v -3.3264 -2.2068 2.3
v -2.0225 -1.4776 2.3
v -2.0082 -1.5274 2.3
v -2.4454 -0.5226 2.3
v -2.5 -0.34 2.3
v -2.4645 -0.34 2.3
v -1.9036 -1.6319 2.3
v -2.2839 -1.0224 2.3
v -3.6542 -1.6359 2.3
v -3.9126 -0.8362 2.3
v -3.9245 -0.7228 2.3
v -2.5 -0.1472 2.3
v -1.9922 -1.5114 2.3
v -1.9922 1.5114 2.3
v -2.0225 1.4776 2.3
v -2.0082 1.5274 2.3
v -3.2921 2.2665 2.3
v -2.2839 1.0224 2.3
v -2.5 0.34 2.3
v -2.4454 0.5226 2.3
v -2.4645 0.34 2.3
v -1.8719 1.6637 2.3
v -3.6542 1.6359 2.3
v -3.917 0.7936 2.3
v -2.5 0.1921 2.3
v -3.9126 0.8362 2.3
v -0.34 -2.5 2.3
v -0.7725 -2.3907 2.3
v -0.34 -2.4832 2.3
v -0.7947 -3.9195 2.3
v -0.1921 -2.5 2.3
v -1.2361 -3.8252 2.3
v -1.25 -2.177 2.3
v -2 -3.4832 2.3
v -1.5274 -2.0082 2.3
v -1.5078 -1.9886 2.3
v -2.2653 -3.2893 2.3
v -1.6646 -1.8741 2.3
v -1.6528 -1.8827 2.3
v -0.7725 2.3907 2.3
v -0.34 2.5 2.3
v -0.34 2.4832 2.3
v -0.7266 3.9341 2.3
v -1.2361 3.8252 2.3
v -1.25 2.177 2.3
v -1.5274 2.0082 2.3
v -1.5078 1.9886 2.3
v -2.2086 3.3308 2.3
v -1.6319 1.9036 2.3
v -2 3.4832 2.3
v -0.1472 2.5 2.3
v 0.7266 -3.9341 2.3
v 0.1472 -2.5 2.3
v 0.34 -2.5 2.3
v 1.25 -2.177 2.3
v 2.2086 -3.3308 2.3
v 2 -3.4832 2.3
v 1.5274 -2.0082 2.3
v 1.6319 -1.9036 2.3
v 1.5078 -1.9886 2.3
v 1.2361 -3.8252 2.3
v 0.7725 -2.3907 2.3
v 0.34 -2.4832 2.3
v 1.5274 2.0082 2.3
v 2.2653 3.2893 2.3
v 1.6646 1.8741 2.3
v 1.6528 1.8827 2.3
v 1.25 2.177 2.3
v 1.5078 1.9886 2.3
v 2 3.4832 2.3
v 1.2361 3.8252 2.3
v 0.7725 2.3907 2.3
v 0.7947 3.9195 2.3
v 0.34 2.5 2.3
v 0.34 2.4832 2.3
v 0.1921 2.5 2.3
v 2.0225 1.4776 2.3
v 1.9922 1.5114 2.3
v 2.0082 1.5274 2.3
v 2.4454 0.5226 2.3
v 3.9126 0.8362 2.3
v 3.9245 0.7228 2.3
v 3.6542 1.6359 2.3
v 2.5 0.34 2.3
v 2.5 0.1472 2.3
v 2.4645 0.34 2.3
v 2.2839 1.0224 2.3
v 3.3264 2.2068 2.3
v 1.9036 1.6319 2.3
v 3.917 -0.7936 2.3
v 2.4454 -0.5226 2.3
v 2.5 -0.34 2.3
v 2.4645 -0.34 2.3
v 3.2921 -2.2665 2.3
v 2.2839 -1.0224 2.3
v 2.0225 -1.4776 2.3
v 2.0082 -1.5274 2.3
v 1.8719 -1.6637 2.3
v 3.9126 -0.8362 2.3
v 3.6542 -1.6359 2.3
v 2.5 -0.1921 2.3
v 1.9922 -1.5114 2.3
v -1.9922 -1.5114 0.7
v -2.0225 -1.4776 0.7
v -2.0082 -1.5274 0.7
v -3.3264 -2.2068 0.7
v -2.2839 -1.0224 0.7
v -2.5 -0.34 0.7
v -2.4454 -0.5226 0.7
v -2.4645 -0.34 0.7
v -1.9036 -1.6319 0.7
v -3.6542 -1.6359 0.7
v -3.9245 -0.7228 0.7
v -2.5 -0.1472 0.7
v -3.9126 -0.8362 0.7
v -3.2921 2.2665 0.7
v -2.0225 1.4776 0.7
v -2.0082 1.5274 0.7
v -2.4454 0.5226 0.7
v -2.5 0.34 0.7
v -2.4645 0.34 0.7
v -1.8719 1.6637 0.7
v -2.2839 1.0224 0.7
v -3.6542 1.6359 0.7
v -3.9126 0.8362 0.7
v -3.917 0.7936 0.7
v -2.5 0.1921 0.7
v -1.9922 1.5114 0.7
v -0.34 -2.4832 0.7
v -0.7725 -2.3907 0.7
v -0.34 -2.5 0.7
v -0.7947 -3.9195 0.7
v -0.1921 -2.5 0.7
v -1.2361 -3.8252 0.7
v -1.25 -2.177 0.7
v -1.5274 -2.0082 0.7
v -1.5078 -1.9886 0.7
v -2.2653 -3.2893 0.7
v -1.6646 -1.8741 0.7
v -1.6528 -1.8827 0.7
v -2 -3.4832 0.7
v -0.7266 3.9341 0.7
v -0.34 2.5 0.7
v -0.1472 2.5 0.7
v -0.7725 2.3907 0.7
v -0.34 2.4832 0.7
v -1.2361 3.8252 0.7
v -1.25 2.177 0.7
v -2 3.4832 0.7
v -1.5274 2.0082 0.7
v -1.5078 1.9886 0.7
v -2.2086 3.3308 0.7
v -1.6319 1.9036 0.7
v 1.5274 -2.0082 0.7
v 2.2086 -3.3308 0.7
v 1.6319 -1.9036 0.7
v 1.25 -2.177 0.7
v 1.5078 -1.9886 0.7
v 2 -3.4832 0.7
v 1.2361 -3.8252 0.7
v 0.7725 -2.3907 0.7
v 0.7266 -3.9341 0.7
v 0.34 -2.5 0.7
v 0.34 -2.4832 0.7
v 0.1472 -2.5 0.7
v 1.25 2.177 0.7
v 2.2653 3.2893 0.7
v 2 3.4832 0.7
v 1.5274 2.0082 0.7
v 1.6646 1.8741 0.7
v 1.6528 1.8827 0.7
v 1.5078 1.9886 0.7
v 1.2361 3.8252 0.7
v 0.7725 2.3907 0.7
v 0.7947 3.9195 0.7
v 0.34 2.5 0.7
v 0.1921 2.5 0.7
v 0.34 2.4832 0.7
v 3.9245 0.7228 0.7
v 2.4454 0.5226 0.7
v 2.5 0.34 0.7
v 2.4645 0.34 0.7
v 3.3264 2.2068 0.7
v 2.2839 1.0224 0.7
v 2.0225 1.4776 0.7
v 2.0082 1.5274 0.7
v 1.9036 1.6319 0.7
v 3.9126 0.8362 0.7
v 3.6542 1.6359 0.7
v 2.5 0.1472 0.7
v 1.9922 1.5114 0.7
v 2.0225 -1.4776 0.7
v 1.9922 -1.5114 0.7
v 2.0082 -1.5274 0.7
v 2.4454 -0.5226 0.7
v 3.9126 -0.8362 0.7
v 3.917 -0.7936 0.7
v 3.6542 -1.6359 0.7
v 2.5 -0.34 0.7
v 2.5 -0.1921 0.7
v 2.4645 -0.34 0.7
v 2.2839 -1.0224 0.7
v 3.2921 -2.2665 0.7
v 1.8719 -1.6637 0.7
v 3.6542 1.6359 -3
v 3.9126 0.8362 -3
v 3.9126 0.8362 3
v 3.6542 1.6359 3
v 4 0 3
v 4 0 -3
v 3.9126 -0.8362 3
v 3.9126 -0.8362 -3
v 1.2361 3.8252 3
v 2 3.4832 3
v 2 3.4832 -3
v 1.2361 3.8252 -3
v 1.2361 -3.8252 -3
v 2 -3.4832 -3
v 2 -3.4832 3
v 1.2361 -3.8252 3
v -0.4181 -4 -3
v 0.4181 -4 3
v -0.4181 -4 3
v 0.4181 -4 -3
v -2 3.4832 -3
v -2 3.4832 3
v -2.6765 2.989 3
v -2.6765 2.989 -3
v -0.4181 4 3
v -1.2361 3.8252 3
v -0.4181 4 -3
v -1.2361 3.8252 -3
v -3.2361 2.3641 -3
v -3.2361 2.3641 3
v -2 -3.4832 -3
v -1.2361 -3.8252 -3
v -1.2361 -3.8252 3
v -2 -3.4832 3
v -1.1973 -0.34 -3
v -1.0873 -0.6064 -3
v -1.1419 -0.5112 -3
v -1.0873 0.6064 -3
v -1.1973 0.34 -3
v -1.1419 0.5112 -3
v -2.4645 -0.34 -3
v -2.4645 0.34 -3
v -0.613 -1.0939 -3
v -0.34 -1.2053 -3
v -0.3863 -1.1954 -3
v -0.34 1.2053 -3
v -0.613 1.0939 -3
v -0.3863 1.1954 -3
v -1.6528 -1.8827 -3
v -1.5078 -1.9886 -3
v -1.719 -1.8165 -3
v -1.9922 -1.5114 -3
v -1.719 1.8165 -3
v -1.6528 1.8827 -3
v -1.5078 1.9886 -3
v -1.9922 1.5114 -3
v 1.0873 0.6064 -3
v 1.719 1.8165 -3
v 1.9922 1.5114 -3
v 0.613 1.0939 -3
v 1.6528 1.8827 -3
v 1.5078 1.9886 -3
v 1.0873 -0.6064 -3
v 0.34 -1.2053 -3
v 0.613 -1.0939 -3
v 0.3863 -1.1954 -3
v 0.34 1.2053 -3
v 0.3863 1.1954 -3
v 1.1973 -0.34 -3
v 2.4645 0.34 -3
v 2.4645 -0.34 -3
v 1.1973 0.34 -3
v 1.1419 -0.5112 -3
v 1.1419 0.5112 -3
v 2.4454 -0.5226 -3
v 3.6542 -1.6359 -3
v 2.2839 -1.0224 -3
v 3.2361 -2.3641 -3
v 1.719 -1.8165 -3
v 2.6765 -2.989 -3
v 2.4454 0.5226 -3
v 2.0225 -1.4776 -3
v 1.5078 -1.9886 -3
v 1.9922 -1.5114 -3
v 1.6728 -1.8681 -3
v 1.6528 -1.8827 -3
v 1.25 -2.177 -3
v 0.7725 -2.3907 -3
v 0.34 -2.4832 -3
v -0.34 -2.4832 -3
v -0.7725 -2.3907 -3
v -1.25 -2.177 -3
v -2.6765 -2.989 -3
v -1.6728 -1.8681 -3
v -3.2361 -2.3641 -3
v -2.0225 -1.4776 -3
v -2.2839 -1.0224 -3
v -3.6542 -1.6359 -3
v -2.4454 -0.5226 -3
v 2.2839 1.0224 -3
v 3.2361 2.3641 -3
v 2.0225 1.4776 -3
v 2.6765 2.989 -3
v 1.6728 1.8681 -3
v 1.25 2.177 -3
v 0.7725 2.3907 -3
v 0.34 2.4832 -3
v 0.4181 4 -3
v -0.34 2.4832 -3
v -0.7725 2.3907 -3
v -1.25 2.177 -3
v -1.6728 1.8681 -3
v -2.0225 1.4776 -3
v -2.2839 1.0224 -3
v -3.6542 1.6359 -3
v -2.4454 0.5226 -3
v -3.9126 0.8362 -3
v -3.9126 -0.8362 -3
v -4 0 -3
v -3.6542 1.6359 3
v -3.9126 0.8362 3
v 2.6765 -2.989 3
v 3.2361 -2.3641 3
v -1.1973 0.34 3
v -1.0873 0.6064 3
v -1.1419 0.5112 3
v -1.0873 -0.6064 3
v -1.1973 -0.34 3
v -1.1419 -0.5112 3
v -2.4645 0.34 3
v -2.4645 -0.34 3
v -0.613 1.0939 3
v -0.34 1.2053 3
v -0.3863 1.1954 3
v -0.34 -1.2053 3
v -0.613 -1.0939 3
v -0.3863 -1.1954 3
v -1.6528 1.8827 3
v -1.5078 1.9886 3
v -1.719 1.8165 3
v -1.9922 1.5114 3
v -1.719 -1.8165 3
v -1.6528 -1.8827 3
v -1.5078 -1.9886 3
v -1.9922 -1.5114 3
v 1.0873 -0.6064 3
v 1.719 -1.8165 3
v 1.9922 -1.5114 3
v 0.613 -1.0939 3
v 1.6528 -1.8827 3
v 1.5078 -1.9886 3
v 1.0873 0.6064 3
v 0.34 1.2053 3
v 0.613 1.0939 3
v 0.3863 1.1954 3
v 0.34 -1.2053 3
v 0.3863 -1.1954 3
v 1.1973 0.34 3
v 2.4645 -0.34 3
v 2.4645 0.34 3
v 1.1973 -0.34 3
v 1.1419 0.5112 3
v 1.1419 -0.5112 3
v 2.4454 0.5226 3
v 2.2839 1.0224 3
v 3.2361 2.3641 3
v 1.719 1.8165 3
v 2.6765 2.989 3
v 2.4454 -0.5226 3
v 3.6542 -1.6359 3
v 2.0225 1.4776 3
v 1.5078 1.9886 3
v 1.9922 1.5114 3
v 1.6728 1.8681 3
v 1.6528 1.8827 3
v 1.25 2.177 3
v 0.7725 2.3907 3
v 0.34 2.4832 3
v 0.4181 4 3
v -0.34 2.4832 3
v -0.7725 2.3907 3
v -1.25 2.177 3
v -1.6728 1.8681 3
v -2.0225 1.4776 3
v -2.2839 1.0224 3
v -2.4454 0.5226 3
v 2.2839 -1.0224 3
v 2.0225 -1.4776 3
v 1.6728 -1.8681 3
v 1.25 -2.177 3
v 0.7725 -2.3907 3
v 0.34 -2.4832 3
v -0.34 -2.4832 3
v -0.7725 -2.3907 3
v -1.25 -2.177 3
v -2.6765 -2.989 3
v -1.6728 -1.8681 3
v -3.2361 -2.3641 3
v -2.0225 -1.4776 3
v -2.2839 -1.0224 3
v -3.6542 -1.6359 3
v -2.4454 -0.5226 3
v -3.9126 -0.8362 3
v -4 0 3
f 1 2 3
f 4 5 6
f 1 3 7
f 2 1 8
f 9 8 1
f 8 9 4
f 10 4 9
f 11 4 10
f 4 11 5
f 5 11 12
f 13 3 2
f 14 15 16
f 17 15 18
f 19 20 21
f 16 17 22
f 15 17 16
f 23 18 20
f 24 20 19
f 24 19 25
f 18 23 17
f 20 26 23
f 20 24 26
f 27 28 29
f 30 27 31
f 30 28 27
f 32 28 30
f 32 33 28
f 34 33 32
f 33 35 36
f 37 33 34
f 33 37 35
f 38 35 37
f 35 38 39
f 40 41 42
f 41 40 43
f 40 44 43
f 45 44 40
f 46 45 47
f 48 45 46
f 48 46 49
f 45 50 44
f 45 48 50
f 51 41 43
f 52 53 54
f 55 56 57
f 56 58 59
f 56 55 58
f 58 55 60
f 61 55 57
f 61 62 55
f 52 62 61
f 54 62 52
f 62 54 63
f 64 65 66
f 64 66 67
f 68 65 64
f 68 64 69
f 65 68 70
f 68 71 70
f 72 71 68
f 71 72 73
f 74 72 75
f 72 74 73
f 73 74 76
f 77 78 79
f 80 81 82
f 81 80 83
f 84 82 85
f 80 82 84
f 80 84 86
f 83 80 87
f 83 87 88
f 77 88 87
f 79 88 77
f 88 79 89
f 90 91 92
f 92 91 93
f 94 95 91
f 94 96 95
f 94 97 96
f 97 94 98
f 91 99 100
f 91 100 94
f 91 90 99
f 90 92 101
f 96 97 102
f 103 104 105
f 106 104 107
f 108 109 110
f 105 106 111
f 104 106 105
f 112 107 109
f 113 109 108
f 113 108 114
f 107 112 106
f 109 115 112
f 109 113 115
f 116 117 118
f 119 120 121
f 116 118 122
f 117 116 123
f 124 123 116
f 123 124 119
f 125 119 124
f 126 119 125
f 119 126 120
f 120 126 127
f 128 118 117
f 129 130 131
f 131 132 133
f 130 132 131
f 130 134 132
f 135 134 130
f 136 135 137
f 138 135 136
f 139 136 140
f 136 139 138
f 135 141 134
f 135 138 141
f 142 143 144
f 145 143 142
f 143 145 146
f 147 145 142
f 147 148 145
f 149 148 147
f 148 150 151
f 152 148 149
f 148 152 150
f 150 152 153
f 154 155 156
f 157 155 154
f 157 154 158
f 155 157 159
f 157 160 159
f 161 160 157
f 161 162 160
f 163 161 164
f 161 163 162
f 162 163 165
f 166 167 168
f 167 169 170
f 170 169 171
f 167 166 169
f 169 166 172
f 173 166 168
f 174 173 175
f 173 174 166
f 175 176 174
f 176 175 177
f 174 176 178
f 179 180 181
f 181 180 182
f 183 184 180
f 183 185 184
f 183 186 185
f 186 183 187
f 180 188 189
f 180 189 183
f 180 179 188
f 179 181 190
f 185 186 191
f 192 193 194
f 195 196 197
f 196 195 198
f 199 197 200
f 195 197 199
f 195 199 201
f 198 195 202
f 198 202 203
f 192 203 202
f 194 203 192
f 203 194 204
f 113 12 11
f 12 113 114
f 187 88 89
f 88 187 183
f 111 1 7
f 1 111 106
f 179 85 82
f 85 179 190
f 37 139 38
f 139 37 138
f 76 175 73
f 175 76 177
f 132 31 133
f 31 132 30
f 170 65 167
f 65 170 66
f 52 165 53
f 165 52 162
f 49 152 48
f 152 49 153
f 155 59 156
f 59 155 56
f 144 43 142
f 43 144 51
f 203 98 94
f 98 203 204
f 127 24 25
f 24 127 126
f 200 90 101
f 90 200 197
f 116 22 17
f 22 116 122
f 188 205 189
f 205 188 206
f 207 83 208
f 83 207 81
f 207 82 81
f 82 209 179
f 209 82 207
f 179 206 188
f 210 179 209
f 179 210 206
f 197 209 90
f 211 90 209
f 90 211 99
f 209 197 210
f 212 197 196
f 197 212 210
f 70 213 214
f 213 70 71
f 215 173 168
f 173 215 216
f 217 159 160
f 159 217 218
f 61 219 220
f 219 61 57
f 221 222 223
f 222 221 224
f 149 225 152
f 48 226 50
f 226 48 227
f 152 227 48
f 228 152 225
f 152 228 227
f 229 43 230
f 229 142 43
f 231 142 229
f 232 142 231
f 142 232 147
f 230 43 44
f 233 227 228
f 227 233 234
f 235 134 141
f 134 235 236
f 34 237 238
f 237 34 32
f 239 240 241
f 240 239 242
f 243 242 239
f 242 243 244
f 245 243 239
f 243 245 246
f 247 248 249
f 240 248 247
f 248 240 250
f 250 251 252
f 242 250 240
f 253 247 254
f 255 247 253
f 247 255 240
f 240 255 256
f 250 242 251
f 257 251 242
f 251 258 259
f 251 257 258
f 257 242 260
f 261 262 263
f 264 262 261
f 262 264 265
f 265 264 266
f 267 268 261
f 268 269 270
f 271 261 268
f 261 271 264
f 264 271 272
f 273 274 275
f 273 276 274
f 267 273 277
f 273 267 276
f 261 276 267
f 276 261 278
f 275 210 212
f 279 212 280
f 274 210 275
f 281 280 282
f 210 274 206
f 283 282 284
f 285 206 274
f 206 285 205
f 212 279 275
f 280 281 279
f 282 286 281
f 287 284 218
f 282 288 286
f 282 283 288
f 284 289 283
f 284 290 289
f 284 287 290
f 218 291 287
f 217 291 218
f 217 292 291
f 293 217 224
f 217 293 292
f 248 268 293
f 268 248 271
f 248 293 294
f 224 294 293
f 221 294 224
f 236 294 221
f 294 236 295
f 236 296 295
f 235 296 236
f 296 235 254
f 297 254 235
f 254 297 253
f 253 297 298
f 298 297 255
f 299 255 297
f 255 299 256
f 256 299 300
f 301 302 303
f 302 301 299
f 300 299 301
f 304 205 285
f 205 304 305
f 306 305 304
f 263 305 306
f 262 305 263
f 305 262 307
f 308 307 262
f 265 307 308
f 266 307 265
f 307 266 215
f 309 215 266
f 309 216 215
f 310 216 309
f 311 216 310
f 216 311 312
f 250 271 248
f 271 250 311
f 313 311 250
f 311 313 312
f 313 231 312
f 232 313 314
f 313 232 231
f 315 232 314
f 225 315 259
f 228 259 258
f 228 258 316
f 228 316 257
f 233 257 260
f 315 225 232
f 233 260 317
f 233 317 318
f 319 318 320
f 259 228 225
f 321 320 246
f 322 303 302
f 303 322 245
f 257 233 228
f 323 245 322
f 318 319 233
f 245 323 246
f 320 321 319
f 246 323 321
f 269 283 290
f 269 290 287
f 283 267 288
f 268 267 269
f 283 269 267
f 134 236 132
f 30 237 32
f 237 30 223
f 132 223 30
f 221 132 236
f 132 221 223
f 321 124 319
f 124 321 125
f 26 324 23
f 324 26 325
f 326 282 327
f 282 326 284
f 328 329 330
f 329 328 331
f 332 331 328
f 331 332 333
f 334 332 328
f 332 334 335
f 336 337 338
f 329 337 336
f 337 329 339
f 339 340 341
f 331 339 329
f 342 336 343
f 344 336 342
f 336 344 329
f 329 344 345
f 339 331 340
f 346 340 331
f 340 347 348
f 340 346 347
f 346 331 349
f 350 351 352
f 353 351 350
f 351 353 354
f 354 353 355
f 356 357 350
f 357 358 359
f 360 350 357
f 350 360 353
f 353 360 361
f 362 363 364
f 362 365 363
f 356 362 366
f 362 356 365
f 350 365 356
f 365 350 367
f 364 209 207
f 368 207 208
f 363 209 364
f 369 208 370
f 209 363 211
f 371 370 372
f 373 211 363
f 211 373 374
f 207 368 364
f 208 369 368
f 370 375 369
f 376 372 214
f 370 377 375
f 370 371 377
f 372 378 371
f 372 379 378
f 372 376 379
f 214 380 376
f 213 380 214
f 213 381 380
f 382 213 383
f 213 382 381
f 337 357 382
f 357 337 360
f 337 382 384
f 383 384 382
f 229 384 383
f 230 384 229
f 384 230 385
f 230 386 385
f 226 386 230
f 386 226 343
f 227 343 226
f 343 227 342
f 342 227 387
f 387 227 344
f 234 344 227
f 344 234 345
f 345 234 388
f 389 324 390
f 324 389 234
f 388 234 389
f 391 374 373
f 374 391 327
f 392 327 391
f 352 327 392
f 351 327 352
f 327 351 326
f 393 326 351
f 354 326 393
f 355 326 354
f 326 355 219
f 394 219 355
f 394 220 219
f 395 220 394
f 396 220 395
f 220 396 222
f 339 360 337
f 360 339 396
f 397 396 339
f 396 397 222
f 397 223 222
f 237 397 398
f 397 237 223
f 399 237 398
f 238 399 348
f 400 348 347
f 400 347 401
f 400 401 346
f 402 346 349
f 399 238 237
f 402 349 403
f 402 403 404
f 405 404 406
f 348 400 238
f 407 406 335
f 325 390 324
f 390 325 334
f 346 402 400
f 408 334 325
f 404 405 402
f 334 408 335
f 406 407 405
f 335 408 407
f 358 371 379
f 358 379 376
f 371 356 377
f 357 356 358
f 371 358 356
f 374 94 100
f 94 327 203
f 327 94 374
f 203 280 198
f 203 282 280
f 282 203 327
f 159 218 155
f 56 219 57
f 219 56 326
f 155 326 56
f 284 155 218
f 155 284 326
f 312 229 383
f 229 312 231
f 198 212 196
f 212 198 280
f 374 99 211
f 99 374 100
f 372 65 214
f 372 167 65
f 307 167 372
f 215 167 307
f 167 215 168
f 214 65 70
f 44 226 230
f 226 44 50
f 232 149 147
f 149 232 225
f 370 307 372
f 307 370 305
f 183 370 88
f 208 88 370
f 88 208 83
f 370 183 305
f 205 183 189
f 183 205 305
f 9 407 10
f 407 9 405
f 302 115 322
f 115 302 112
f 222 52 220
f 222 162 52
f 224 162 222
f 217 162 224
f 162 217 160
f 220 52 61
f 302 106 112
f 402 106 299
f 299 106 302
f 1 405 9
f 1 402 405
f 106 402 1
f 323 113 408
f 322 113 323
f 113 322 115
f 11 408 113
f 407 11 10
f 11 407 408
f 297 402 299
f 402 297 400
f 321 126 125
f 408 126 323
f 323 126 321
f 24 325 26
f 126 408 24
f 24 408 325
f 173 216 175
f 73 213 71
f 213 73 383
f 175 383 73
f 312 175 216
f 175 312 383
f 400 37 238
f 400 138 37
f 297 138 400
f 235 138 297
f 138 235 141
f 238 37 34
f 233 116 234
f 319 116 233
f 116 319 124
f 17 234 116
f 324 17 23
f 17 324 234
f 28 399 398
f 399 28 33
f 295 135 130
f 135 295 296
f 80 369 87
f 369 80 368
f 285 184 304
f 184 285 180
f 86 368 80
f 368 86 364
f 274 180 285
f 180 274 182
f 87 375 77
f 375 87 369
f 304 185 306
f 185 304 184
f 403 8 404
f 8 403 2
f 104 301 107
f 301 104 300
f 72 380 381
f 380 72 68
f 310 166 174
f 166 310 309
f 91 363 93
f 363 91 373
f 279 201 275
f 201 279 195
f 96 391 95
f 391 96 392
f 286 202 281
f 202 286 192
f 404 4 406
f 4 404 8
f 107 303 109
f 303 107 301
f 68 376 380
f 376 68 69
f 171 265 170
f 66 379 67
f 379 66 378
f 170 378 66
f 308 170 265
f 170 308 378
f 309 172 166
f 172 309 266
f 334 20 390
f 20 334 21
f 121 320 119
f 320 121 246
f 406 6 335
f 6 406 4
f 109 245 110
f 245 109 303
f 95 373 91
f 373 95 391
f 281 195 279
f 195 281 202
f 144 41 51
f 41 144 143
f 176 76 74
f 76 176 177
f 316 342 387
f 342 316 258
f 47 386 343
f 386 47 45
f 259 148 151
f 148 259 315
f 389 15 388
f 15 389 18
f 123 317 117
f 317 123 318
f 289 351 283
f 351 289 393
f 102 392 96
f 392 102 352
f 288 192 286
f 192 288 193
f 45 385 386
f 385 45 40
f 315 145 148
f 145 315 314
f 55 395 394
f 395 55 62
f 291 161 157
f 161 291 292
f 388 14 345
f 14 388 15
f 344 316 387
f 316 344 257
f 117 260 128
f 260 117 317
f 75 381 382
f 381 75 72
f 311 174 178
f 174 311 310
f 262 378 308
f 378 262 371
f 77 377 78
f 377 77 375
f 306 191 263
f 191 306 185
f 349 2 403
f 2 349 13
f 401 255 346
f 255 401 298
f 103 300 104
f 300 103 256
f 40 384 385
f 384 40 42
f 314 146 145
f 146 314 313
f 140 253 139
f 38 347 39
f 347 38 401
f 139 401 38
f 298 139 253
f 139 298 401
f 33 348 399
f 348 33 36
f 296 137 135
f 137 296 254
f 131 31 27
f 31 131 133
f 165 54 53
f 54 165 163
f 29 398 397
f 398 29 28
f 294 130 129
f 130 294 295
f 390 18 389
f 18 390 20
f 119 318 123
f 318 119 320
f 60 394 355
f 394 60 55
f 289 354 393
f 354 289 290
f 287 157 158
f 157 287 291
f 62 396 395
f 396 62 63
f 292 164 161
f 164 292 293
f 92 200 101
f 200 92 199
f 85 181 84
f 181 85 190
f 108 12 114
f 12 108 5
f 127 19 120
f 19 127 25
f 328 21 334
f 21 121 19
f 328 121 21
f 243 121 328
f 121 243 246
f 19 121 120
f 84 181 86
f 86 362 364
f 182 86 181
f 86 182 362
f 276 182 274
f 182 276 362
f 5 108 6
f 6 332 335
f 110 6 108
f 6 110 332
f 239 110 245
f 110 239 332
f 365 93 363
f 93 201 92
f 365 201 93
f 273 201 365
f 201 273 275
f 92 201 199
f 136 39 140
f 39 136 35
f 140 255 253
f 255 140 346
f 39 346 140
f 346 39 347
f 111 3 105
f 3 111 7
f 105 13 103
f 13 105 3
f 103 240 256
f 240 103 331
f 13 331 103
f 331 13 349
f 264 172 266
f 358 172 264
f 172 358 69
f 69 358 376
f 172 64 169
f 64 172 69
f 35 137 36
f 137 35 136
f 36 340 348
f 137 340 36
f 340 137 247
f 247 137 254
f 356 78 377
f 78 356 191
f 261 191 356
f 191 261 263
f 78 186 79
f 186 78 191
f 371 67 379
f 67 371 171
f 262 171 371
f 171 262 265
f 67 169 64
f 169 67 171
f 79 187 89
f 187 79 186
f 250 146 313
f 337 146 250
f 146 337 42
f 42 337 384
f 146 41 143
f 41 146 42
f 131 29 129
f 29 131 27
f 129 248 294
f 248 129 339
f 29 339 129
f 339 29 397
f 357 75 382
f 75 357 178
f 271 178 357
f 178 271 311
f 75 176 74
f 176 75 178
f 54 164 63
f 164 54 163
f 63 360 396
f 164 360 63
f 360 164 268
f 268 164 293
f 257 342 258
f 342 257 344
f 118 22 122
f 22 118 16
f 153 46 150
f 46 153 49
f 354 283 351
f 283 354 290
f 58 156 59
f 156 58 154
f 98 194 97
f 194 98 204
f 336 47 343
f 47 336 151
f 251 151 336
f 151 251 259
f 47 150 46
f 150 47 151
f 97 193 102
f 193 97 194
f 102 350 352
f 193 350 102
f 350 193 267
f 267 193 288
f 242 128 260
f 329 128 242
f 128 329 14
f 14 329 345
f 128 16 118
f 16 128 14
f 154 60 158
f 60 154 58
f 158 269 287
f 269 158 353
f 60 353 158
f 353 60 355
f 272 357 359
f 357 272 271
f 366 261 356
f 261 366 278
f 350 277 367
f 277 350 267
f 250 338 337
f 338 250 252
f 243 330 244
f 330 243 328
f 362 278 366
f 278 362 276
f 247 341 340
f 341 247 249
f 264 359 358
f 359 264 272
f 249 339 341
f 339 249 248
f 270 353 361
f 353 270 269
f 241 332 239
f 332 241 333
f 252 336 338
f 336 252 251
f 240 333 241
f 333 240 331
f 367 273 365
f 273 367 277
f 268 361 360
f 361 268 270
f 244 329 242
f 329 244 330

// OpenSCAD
/* [Basic] */

d = 8;            // [4:20]
height = 6;       // [1:20]
// Must small than `d`, affects flow
d_inner = 5;      // [3:20]
// Diameter of central rod, affects flow
d_central = 2.5;  // [0:10]

/* [Advanced] */

// Thickness of the radial walls 
thickness = 0.68;

// ----------------
/* [Hidden] */

$fn=30;

difference() {
  rod(d=d, h=height);
  rod(d=d_inner, h=height+1);
  translated(height/4*z) rotated(22*z) rotated(45*z, n=[0:3]) box([d+1, d/5, d/5]);
}

rotated(45*z, n=[0:3]) box([d_inner, thickness, height]);
rod(d=d_central, h=height);


// ----------------
// https://github.com/davidson16807/relativity.scad

_digit = "0123456789";
_lowercase = "abcdefghijklmnopqrstuvwxyz";
_uppercase = "ABCDEFGHIJKLMNOPQRSTUVWXYZ";
_letter = str(_lowercase, _uppercase);
_alphanumeric = str(_letter, _digit);
_variable_safe = str(_alphanumeric, "_");
_whitespace = " \t\r\n";
_nonsymbol = str(_alphanumeric, _whitespace);

_regex_ops = "?*+&|";

_strings_version = 
	[2014, 3, 17];
function strings_version() =
	_strings_version;
function strings_version_num() =
	_strings_version.x * 10000 + _strings_version.y * 100 + _strings_version.z;

//returns a list representing the tokenization of an input string
//echo(tokenize("not(foo)"));
//echo(tokenize("foo bar baz  "));
_token_regex_ignore_space = _parse_rx("\\w+|\\S");
_token_regex = _parse_rx("\\w+|\\S|\\s+");
function tokenize(string, ignore_space=true) = 
    _tokenize(string, ignore_space? _token_regex_ignore_space : _token_regex);
function _tokenize(string, pattern) = 
    _grep(string, _index_of(string, pattern, regex=true));

function grep(string, pattern, ignore_case=false) = 		//string
    _grep(string, _index_of(string, _parse_rx(pattern), regex=true, ignore_case=ignore_case));
function _grep(string, indices) = 
    [for (index = indices)
        between(string, index.x, index.y)
    ];


function replace(string, replaced, replacement, ignore_case=false, regex=false) = 
	_replace(string, replacement, index_of(string, replaced, ignore_case=ignore_case, regex=regex));
    
function _replace(string, replacement, indices, i=0) = 
    i >= len(indices)?
        after(string, indices[len(indices)-1].y-1)
    : i == 0?
        str( before(string, indices[0].x), replacement, _replace(string, replacement, indices, i+1) )
    :
        str( between(string, indices[i-1].y, indices[i].x), replacement, _replace(string, replacement, indices, i+1) )
    ;


function split(string, seperator=" ", ignore_case = false, regex=false) = 
	_split(string, index_of(string, seperator, ignore_case=ignore_case, regex=regex));
    
function _split(string, indices, i=0) = 
    len(indices) == 0?
        [string]
    : i >= len(indices)?
        _coalesce_on(after(string, indices[len(indices)-1].y-1), "", [])
    : i == 0?
        concat( _coalesce_on(before(string, indices[0].x), "", []), _split(string, indices, i+1) )
    :
        concat( between(string, indices[i-1].y, indices[i].x), _split(string, indices, i+1) )
    ;

function contains(string, substring, ignore_case=false, regex=false) = 
	regex?
        _index_of_first(string, _parse_rx(substring), regex=regex, ignore_case=ignore_case) != undef
	:
		_index_of_first(string, substring, regex=regex, ignore_case=ignore_case) != undef
	; 
	


function index_of(string, pattern, ignore_case=false, regex=false) = 
	_index_of(string, 
        regex? _parse_rx(pattern) : pattern, 
        regex=regex, 
        ignore_case=ignore_case);
function _index_of(string, pattern, pos=0, regex=false, ignore_case=false) = 		//[start,end]
	pos == undef?
        undef
	: pos >= len(string)?
		[]
	:
        _index_of_recurse(string, pattern, 
            _index_of_first(string, pattern, pos=pos, regex=regex, ignore_case=ignore_case),
            pos, regex, ignore_case)
	;
function _index_of_recurse(string, pattern, index_of_first, pos, regex, ignore_case) = 
    index_of_first == undef?
        []
    : concat(
        [index_of_first],
        _coalesce_on(
            _index_of(string, pattern, 
                    pos = index_of_first.y,
                    regex=regex,
                    ignore_case=ignore_case),
            undef,
            [])
    );
function _index_of_first(string, pattern, pos=0, ignore_case=false, regex=false) =
	pos == undef?
        undef
    : pos >= len(string)?
		undef
	: _coalesce_on([pos, _match(string, pattern, pos, regex=regex, ignore_case=ignore_case)], 
		[pos, undef],
		_index_of_first(string, pattern, pos+1, regex=regex, ignore_case=ignore_case))
    ;
function _match(string, pattern, pos, regex=false, ignore_case=false) = 
    regex?
        _match_parsed_rx(string, pattern, pos, ignore_case=ignore_case)
    : starts_with(string, pattern, pos, ignore_case=ignore_case)? 
        pos+len(pattern) 
    : 
        undef
    ;
    
    
function starts_with(string, start, pos=0, ignore_case=false, regex=false) = 
	regex?
		_match_parsed_rx(string,
			_parse_rx(start), 
			pos, 
			ignore_case=ignore_case) != undef
	:
		equals(	substring(string, pos, len(start)), 
			start, 
			ignore_case=ignore_case)
	;
function ends_with(string, end, ignore_case=false) =
	equals(	after(string, len(string)-len(end)-1), 
		end,
		ignore_case=ignore_case)
	;







function _match_regex(string, pattern, pos=0, ignore_case=false) = 		//end pos
	_match_parsed_rx(string,
		_parse_rx(pattern), 
		pos, 
		ignore_case=ignore_case);
	
//converts an infix notated regex string to a parse tree using the shunting yard algorithm
function _parse_rx(	rx, 		ops=[], 	args=[], 				i=0) = 
	rx == undef?
		undef
	: i >= len(rx)?
		len(ops) <= 0?
			args[0]
		:
			_parse_rx(rx, _pop(ops), 	_push_rx_op(args, ops[0]), 		i)
			
			
	: ops[0] == "{"?
		rx[i] == "}"?
			_parse_rx(rx, _pop(ops), 	_push_rx_op(args, ops[0]), 		 i+1)
		: rx[i] == ","?
			_parse_rx(rx, ops, 		_swap(args, _push(args[0], "")), 	 i+1)
		: 
			_parse_rx(rx, ops, 		_swap(args, _swap(args[0], str(args[0][0], rx[i]))), i+1)
			
			
	: ops[0] == "[" || ops[0] == "[^"?
		rx[i] == "]"?
			_parse_rx(rx, _pop(ops), 	_push_rx_op(args, ops[0]), 		i+1)
		: rx[i] == "\\"?
			_parse_rx(rx, ops, 		_swap(args, _push(args[0],rx[i+1])), 	i+2)
		: rx[i] == "-"?
			_parse_rx(rx, ops, 		_swap(args, _push(_pop(args[0]), ["-", args[0][0], rx[i+1]])), i+2)
		:
			_parse_rx(rx, ops, 		_swap(args, _push(args[0], rx[i])), 	i+1)
	: rx[i] == "[" && rx[i+1] == "^"?
		!_can_concat(rx, i)?
			_parse_rx(rx, _push(ops, "[^"),	_push(args, []),	 		i+2)
		: _can_shunt(ops, "&")?
			_parse_rx(rx, _push(_push(ops,"&"),"[^"), _push(args, []), i+2)
		:
			_parse_rx(rx, _pop(ops), 	_push_rx_op(args, ops[0]), 		i)
	: rx[i] == "["?
		!_can_concat(rx, i)?
			_parse_rx(rx, _push(ops, "["), 	_push(args, []),	 		i+1)
		: _can_shunt(ops, "&")?
			_parse_rx(rx, _push(_push(ops,"&"),"["), _push(args, []), i+1)
		:
			_parse_rx(rx, _pop(ops), 	_push_rx_op(args, ops[0]), 		i)
			
	: rx[i] == "{"?
			_parse_rx(rx, _push(ops, "{"),	_push(args, ["", []]), 			i+1)
			
			
	: is_in(rx[i], _regex_ops)?
		_can_shunt(ops, rx[i])?
			_parse_rx(rx, _push(ops, rx[i]), args, 		 		i+1)
		:
			_parse_rx(rx, _pop(ops), 	_push_rx_op(args, ops[0]), 		i)
	: rx[i] == ")"?
		ops[0] == "(" ?
			_parse_rx(rx, _pop(ops), 	args,			 		i+1)
		: len(ops) <= 0 ?
			_parse_rx(rx, ops, 		args,			 		i+1)
		: 
			_parse_rx(rx, _pop(ops), 	_push_rx_op(args, ops[0]), 		i)
	: rx[i] == "("?
		!_can_concat(rx, i)?
			_parse_rx(rx, _push(ops, "("), 	args, 		 			i+1)
		: _can_shunt(ops, "&")?
			_parse_rx(rx, _push(_push(ops, "&"), "("), args, 	 		i+1)
		:
			_parse_rx(rx, _pop(ops), 	_push_rx_op(args, ops[0]), 		i)
	: rx[i] == "\\"?
		!_can_concat(rx, i)?
			_parse_rx(rx, ops, 			_push(args,str(rx[i],rx[i+1])),	i+2)
		: _can_shunt(ops, "&")?
			_parse_rx(rx, _push(ops, "&"),	_push(args,str(rx[i],rx[i+1])),	i+2)
		:
			_parse_rx(rx, _pop(ops), 	_push_rx_op(args, ops[0]), 		i)
	:
		!_can_concat(rx, i)?
			_parse_rx(rx, ops, 		_push(args, rx[i]),	 		i+1)
		: _can_shunt(ops, "&")?
			_parse_rx(rx, _push(ops, "&"),	_push(args, rx[i]),	 		i+1)
		:
			_parse_rx(rx, _pop(ops), 	_push_rx_op(args, ops[0]), 		i)
	;

	
function _can_concat(regex, i) = 
	regex[i-1] != undef &&
	(!is_in(regex[i-1], "|(") || regex[i-2] == "\\");
	
function _can_shunt(stack, op) = 
	stack[0] == "(" || 
	len(stack) <= 0 || 
	_precedence(op, _regex_ops) < _precedence(stack[0], _regex_ops);
	
function _push_rx_op(stack, op) = 
	is_in(op[0], "[?*+")? // is unary?
		_push(_pop(stack), 	[op, stack[0]])
	: 		 	// is binary?
		_push(_pop(stack,2), 	[op, stack[1][0], stack[0], ])
	;

function _swap(stack, replacement) = 
	_push(_pop(stack), replacement);
function _pop(stack, n=1) = 
	n <= 1?
		len(stack) <=0? [] : stack[1]
	:
		_pop(_pop(stack), n-1)
	;
function _push(stack, char) = 
	[char, stack];

function _precedence(op, ops) = 
	search(op, ops)[0];
	
function _match_parsed_rx(string, regex, string_pos=0, ignore_case=false) = 
	//INVALID INPUT
	string == undef?
		undef
	
	//string length and anchors
	: regex == "^"?
		string_pos == 0?
			string_pos
		:
			undef
	: regex == "$"?
		string_pos >= len(string)?
			string_pos
		:
			undef
	: string_pos == undef?
		undef
	: string_pos >= len(string)?
		undef
		
	//ALTERNATION
	: regex[0] == "|" ?
		_null_coalesce(
			_match_parsed_rx(string, regex[1], string_pos, ignore_case=ignore_case),
			_match_parsed_rx(string, regex[2], string_pos, ignore_case=ignore_case)
		)

	//KLEENE STAR
	: regex[0] == "*" ?
		_match_repetition(string, regex[1],
			0, undef,
			string_pos,
			ignore_case=ignore_case)

	//KLEENE BRACKETS
	: regex[0] == "{" ?
		regex[2][1][0] == undef?
			_match_repetition(string, regex[1],
				_parse_int(regex[2][0], 10), undef,
				string_pos,
				ignore_case=ignore_case)
		:
			_match_repetition(string, regex[1],
				_parse_int(regex[2][1][0], 10), _parse_int(regex[2][0], 10),
				string_pos,
				ignore_case=ignore_case)
		
	//KLEENE PLUS
	: regex[0] == "+" ?
		_match_repetition(string, regex[1],
			1, undef,
			string_pos,
			ignore_case=ignore_case)

	//OPTION
	: regex[0] == "?" ?
		_match_repetition(string, regex[1],
			0, 1,
			string_pos,
			ignore_case=ignore_case)

	//CONCATENATION
	: regex[0] == "&" ?	
		_match_parsed_rx(string, regex[2], 
			_match_parsed_rx(string, regex[1], string_pos, ignore_case=ignore_case), 
			ignore_case=ignore_case)
			
	//ESCAPE CHARACTER
	: regex == "\\d"?
		is_in(string[string_pos], _digit)?
			string_pos+1
		: 
			undef
	: regex == "\\s"?
		is_in(string[string_pos], _whitespace)?
			string_pos+1
		: 
			undef
	: regex == "\\w"?
		is_in(string[string_pos], _alphanumeric)?
			string_pos+1
		: 
			undef
	: regex == "\\D"?
		!is_in(string[string_pos], _digit)?
			string_pos+1
		: 
			undef
				
	: regex == "\\S"?
		!is_in(string[string_pos], _whitespace)?
			string_pos+1
		: 
			undef
	: regex == "\\W"?
		!is_in(string[string_pos], _alphanumeric)?
			string_pos+1
		: 
			undef
	: regex[0] == "\\"?
		string[string_pos] == regex[0][1]?
			string_pos+1
		:
			undef
	
	//CHARACTER SET
	: regex[0] == "[" ?
		_is_in_stack(string[string_pos], regex[1], ignore_case=ignore_case)?
			string_pos+1
		:
			undef
	//NEGATIVE CHARACTER SET
	: regex[0] == "[^" ?
		!_is_in_stack(string[string_pos], regex[1], ignore_case=ignore_case)?
			string_pos+1
		:
			undef
		
	//LITERAL
	: equals(string[string_pos], regex, ignore_case=ignore_case) ?
		string_pos+1
	
	//WILDCARD
	: regex == "."?
		string_pos+1
	
	//NO MATCH
	: 
		undef
	;


function is_empty(string) = 
	string == "";

function is_null_or_empty(string) = 
	string == undef || string == "";
	
function is_null_or_whitespace(string) = 
	string == undef || trim(string) == "";

function trim(string) = 
	string == undef?
		undef
	: string == ""?
		""
	:
		_null_coalesce(
			between(string, _match_set(string, _whitespace, 0), 
					_match_set_reverse(string, _whitespace, len(string))),
			""
		)
	;

function _match_repetition(string, regex, min_reps, max_reps, pos, ignore_case=false) = 
    pos == undef?
        undef
    : pos > len(string)?
        undef
	: _null_coalesce(
		_match_repetition(string, regex, min_reps-1, max_reps-1, 
			_match_parsed_rx(string, regex, pos, ignore_case=ignore_case), 
            ignore_case=ignore_case),
		(min_reps== undef || min_reps <= 0) && (max_reps == undef || max_reps >= 0)?
			pos
		: 
			undef
	);
	
function _match_set(string, set, pos) = 
	pos >= len(string)?
		len(string)
	: is_in(string[pos], set )?
		_match_set(string, set, pos+1)
	: 
		pos
	;

function _match_set_reverse(string, set, pos) = 
	pos <= 0?
		0
	: is_in(string[pos-1], set)?
		_match_set_reverse(string, set, pos-1)
	: 
		pos
	;

function _match_quote(string, quote_char, pos) = 
	pos >= len(string)?
		len(string)
	: string[pos] == quote_char?
		pos
	: string[pos] == "\\"? 
		_match_quote(string, quote_char, pos+2)
	: 
		_match_quote(string, quote_char, pos+1)
	;

	
function _is_in_range(char, min_char, max_char) = 
	search(char, _alphanumeric,0)[0][0] >= search(min_char, _alphanumeric,0)[0][0] &&
	search(char, _alphanumeric,0)[0][0] <= search(max_char, _alphanumeric,0)[0][0];
function _is_in_stack(string, stack, ignore_case=false) = 
	stack == undef?
		false
	: len(stack) <= 0?
		false
	: stack[0][0] == "-"?
		_is_in_range(string, stack[0][1], stack[0][2])
	: string == stack[0]?
		true
	: ignore_case && lower(string) == lower(stack[0])?
		true
	:
		_is_in_stack(string, _pop(stack), ignore_case=ignore_case)
	;

function equals(this, that, ignore_case=false) = 
	ignore_case?
		lower(this) == lower(that)
	:
		this==that
	;

function lower(string) = 
	_transform_case(string, search(string, "ABCDEFGHIJKLMNOPQRSTUVWXYZ",0), 97);

function upper(string) = 
	_transform_case(string, search(string, "abcdefghijklmnopqrstuvwxyz",0), 65);

//TODO: convert to list comprehensions
function _transform_case(string, encodings, offset) = 
    join([for (i = [0:len(encodings)-1])
            len(encodings[i]) > 0?
                chr(encodings[i][0] + offset)
            :
                string[i]
    ])
	;


function reverse(string) = 
	string == undef?
		undef
	: len(string) <= 0?
		""
	: 
        join([for (i = [0:len(string)-1]) string[len(string)-1-i]])
    ;

function substring(string, start, length=undef) = 
	length == undef? 
		between(string, start, len(string)) 
	: 
		between(string, start, length+start)
	;

//note: start is inclusive, end is exclusive
function between(string, start, end) = 
	string == undef?
		undef
	: start == undef?
		undef
	: start > len(string)?
		undef
	: start < 0?
		before(string, end)
	: end == undef?
		undef
	: end < 0?
		undef
	: end > len(string)?
		after(string, start-1)
	: start > end?
		undef
	: start == end ? 
		"" 
	: 
        join([for (i=[start:end-1]) string[i]])
	;

function before(string, index=0) = 
	string == undef?
		undef
	: index == undef?
		undef
	: index > len(string)?
		string
	: index <= 0?
		""
	: 
        join([for (i=[0:index-1]) string[i]])
	;

function after(string, index=0) =
	string == undef?
		undef
	: index == undef?
		undef
	: index < 0?
		string
	: index >= len(string)-1?
		""
	:
        join([for (i=[index+1:len(string)-1]) string[i]])
	;
	

	

function parse_int(string, base=10, i=0, nb=0) = 
	string[0] == "-" ? 
		-1*_parse_int(string, base, 1) 
	: 
		_parse_int(string, base);

function _parse_int(string, base, i=0, nb=0) = 
	i == len(string) ? 
		nb 
	: 
		nb + _parse_int(string, base, i+1, 
				search(string[i],"0123456789ABCDEF")[0]*pow(base,len(string)-i-1));
                
function join(strings, delimeter="") = 
	strings == undef?
		undef
	: strings == []?
		""
	: _join(strings, len(strings)-1, delimeter, 0);
function _join(strings, index, delimeter) = 
	index==0 ? 
		strings[index] 
	: str(_join(strings, index-1, delimeter), delimeter, strings[index]) ;
	
function is_in(string, list, ignore_case=false) = 
	string == undef?
		false
    : 
        any([ for (i = [0:len(list)-1]) equals(string, list[i], ignore_case=ignore_case) ])
	;
function any(booleans, index=0) = 
    index > len(booleans)?
        false
    : booleans[index]?
        true
    :
        any(booleans, index+1)
    ;
function all(booleans, index=0) = 
	index >= len(booleans)?
		true
	: !booleans[index]?
		false
	: 
		all(booleans, index+1)
	;

function _null_coalesce(string, replacement) = 
	string == undef?
		replacement
	:
		string
	;
function _coalesce_on(value, error, fallback) = 
	value == error?
		fallback
	: 
		value
	;
	

















function relativity_version() =
	[2015, 11, 26];
function relativity_version_num() = 
	relativity_version().x * 10000 + relativity_version().y * 100 + relativity_version().z;
//echo(str("relativity.scad ", relativity_version().x, ".", relativity_version().y, ".", relativity_version().z));

if(version_num() < 20150000)
	echo("WARNING: relativity.scad requires OpenSCAD version 2015.03 or higher");


// an arbitrarily large number
// must be finite to allow use in geometric operations
// interaction between objects of indeterminate size results in undefined behavior
indeterminate = 1e6;

// an arbitrarily small number
// must be nonzero to meet the assumptions of the library

infinitesimal = 0.001;

// helper variables for aligning along the z axis
top = [0,0,1];
center=[0,0,0];
bottom = [0,0,-1];
up = [0,0,1];
down = [0,0,-1];
x = [1,0,0];
y = [0,1,0];
z = [0,0,1];

// properties of the last instance of rod/box/ball in the call stack
$parent_size=[0,0,0];
$parent_bounds=[0,0,0];
$parent_radius=0;
$parent_type="space";
// a stack of classes used by all ancestors
$_ancestor_classes = [];
_token_regex_ignore_dash = _parse_rx("(\\w|-)+|\\S");

//inhereted properties common to all geometric primitives in relativity.scad
// indicates the class(es) to render
$_show = "*";
// indicates the class that is either assigned-to or inherited-by an object
$class = [];
// indicates the absolute position of a primitive
$position = [0,0,0];
// a vector indicating the direction of a parent object		
$inward = [0,0,0];		
$outward = [0,0,0];

//hadamard product (aka "component-wise" product) for vectors
function hadamard(v1,v2) = [v1.x*v2.x, v1.y*v2.y, v1.z*v2.z];

module class(name){
    _assign($class = name)
	_assign($_ancestor_classes = _push($_ancestor_classes, _tokenize($class, _token_regex_ignore_dash)))
    if(_sizzle_engine($_ancestor_classes, $_show))  
        children();
}

module selectable(){
    _assign(
        $_ancestor_classes = _push($_ancestor_classes, 
            _tokenize($class, _token_regex_ignore_dash)
        )
    )
    if(_sizzle_engine($_ancestor_classes, $_show))  
        children();
}

module _child_wrapper(){
    for (i = [0 : $children-1]){
        //selectable()
        children(i);
    }
}

// form repeating patterns through translation
module translated(offsets, n=[1], class="*"){
	offsets = len(offsets.x) == undef && offsets.x != undef? [offsets] : offsets;
	for(offset=offsets)
	{
        show(class)
        for(i=n)
            _translate(offset*i)
                _child_wrapper() children();
        hide(class)
            _child_wrapper() children();
    }
}

// form radially symmetric objects around the z axis
module rotated(offsets, n=[1], class="*"){
	offsets = len(offsets.x) == undef && offsets.x != undef? [offsets] : offsets;
	for(offset=offsets)
	{
        show(class)
        for(i=n)
            rotate(offset*i)
                _child_wrapper() children();
        hide(class)
            _child_wrapper() children();
    }
}

// form bilaterally symmetric objects using the mirror() function
module mirrored(axes=[0,0,0], class="*"){
	axes = len(axes.x) == undef && axes.x != undef? [axes] : axes;
	for(axis=axes)
	{
        show(class)
        mirror(axis)
            _child_wrapper() children();
        show(class)
            _child_wrapper() children();
        hide(class)
            _child_wrapper() children();
    }
}

module attach(class){
	_assign($_ancestor_classes = _push($_ancestor_classes, _tokenize($class, _token_regex_ignore_dash)))
	_assign($_show=["and", $_show, ["descendant", "*", _sizzle_parse(class)]])
	_child_wrapper() children();
}

module show(class="*"){
	_assign($_show=["and", $_show, _sizzle_parse(class)])
	_child_wrapper() children();
}

module hide(class="*"){
	_assign($_show=["and", $_show, ["not", _sizzle_parse(class)]])
	_child_wrapper() children();
}

module colored(color, class="*"){
	_assign($_show=["and", $_show, _sizzle_parse(class)])
	color(color)
	_child_wrapper() children();
	
	hide(class)
	_child_wrapper() children();
}

module scaled(v=[0,0,0], class="*"){
	_assign($_show=["and", $_show, _sizzle_parse(class)])
	scale(v)
	_child_wrapper() children();
	
	hide(class)
	_child_wrapper() children();
}

module resized(newsize, class="*"){
	_assign($_show=["and", $_show, _sizzle_parse(class)])
	resize(newsize)
	_child_wrapper() children();
	
	hide(class)
	_child_wrapper() children();
}

module hulled(class="*"){
    _assign($_ancestor_classes = _push($_ancestor_classes, _tokenize($class, _token_regex_ignore_dash)))
	if(_sizzle_engine($_ancestor_classes, $_show))
	hull()
	_assign($_show=_sizzle_parse(class))
	_child_wrapper() children();
	
	hide(class)
	_child_wrapper() children();
}

// performs the union on objects marked as positive space (i.e. objects where $class = positive), 
// and performs the difference for objects marked as negative space (i.e objects where $class = $negative)
module differed(negative, positive="*", unaffected=undef){
	_positive = _sizzle_parse(positive);
	_negative = _sizzle_parse(negative);
	_unaffected = unaffected != undef? 
        _sizzle_parse(unaffected) : ["not", ["or", _positive, _negative]];
    
    _assign($_ancestor_classes = _push($_ancestor_classes, _tokenize($class, _token_regex_ignore_dash)))
    if(_sizzle_engine($_ancestor_classes, $_show))
    difference(){
        _assign($_show = _positive)
            _child_wrapper() children();
        _assign($_show = _negative)
            _child_wrapper() children();
    }
    _assign($_show=["and", $_show, _unaffected])
        _child_wrapper() children();
}

// performs the intersection on a list of object classes
module intersected(class1, class2, unaffected=undef){
	class1 = _sizzle_parse(class1);
	class2 = _sizzle_parse(class2);
	unaffected = unaffected != undef? 
		unaffected : ["not", ["or", class1, class2]];
    
    _assign($_ancestor_classes = _push($_ancestor_classes, _tokenize($class, _token_regex_ignore_dash)))
    if(_sizzle_engine($_ancestor_classes, $_show))
    intersection(){
        _assign($_show = class1)
            _child_wrapper() children();
        _assign($_show = class2)
            _child_wrapper() children();
    }
    _assign($_show=["and", $_show, unaffected])
        _child_wrapper() children();
}

// like translate(), but use positions relative to the size of the parent object
// if tilt==true, child objects will also be oriented away from the parent object's center
module align(anchors, bounds="box"){
	anchors = len(anchors.x)==undef && anchors.x!= undef? [anchors] : anchors;
	for(anchor=anchors)
	{
		if(bounds == "box")
		_translate(hadamard(anchor, $parent_bounds)/2)
		_assign($outward = anchor, $inward = -anchor)
			_child_wrapper() children();
		
		if(bounds == "ball"){
			_anchor = _rotate_matrix(_orient_angles(anchor)) * [0,0,1,1];
			_translate(hadamard(_anchor, $parent_bounds)/2)
			_assign($outward = anchor, $inward = -anchor)
				_child_wrapper() children();
		}
	}
}

// like rotate(), but works by aligning the zaxis to a given vector
module orient(zaxes, roll=0){
	zaxes = len(zaxes.x) == undef && zaxes.x != undef? [zaxes] : zaxes;
	for(zaxis=zaxes)
	{
		rotate(_orient_angles(zaxis))
		rotate(roll*z)
			_child_wrapper() children();
	}
}

// duplicates last instance of box/rod/ball in the call stack
// useful for performing hull() or difference() between parent and child 
module parent(size=undef, anchor=center){
	echo("WARNING: parent() module is depreciated. Please use CSG operators such as differed() and hulled().");
	size = size==undef? $parent_size : size;
	if($parent_type=="box") 
		box(size, anchor=anchor)
			children();
	else if($parent_type=="rod")
		rod(size, anchor=anchor)
			children();
	else if($parent_type=="ball")
		ball(size, anchor=anchor)
			children();
}

// wrapper for cube with enhanced centering functionality and cascading children
module box(	size=[1,1,1], 
			h=undef, d=undef, r=undef, 
			anchor=$inward, bounds="box") {
    
	d = r!=undef? 2*r : d;
	size =	len(size)==undef && size!= undef? 
                [size,size,size] 
            : d != undef && h == undef? 
                [d,d,indeterminate] 
            : d == undef && h != undef? 
                [indeterminate, indeterminate, h] 
            : d != undef && h != undef?
                [d,d,h] 
            : 
                size
            ;
                
	_assign($parent_size = size, 
			$parent_type="box", 
			$parent_bounds=[size.x < indeterminate/2? size.x : 0,
							size.y < indeterminate/2? size.y : 0,
							size.z < indeterminate/2? size.z : 0],
			$parent_radius=sqrt(pow(size.x/2,2) + pow(size.y/2,2) + pow(size.z/2,2)),
			$_ancestor_classes = _push($_ancestor_classes, _tokenize($class, _token_regex_ignore_dash)),
			$inward=center, 
			$outward=center){
		_translate(-hadamard(anchor, $parent_size)/2)
			if(_sizzle_engine($_ancestor_classes, $_show)) cube($parent_size, center=true);
		_translate(-hadamard(anchor, $parent_bounds)/2)
			_child_wrapper() children();
	}
}
// wrapper for cylinder with enhanced centering functionality and cascading children
module rod(	size=[1,1,1], 
			h=undef, d=undef, r=undef, 
			anchor=$inward, orientation=top, bounds="rod") {
                
	d = r!=undef? 2*r : d;
	size =	len(size)==undef && size!= undef? 
                [size,size,size] 
            : d != undef && h == undef? 
                [d,d,indeterminate] 
            : d == undef && h != undef? 
                [indeterminate, indeterminate, h] 
            : d != undef && h != undef?
                [d,d,h] 
            : 
                size
            ;
    _bounds = _rotate_matrix(_orient_angles(orientation)) * [size.x,size.y,size.z,1];
                
	_assign($parent_size = size, 
			$parent_type="rod",
			$parent_bounds=[abs(_bounds.x) < indeterminate/2? abs(_bounds.x) : 0,
							abs(_bounds.y) < indeterminate/2? abs(_bounds.y) : 0,
							abs(_bounds.z) < indeterminate/2? abs(_bounds.z) : 0],
			$parent_radius=sqrt(pow(h/2,2)+pow(d/2,2)),
			$_ancestor_classes = _push($_ancestor_classes, _tokenize($class, _token_regex_ignore_dash)),
			$inward=center, 
			$outward=center){
		_translate(-hadamard(anchor, [abs(_bounds.x),abs(_bounds.y),abs(_bounds.z)])/2){
			if(_sizzle_engine($_ancestor_classes, $_show))
				orient(orientation) 
				resize($parent_size) 
				cylinder(d=$parent_size.x, h=$parent_size.z, center=true);
		}
		_translate(-hadamard(anchor, $parent_bounds)/2)
			_child_wrapper() children();
	}
}
// wrapper for cylinder with enhanced centering functionality and cascading children
module ball(size=[1,1,1], 
			h=undef, d=undef, r=undef, 
			anchor=$inward, bounds="ball") {
	//diameter is used internally to simplify the maths
	d = r!=undef? 2*r : d;
	size =	len(size)==undef && size!= undef? 
                [size,size,size] 
            : d != undef && h == undef? 
                [d,d,d] 
            : d == undef && h != undef? 
                [h, h, h] 
            : d != undef && h != undef?
                [d,d,h] 
            : 
                size
            ;
                
	_assign($parent_size = size, 
			$parent_type="ball", 
			$parent_bounds=[size.x < indeterminate/2? size.x : 0,
							size.y < indeterminate/2? size.y : 0,
							size.z < indeterminate/2? size.z : 0],
			$parent_radius=sqrt(pow(size.x/2,2) + pow(size.y/2,2) + pow(size.z/2,2)),
			$_ancestor_classes = _push($_ancestor_classes, _tokenize($class, _token_regex_ignore_dash)),
			$inward=center, 
			$outward=center ){
		_translate(-hadamard(anchor, $parent_size)/2)
			if(_sizzle_engine($_ancestor_classes, $_show)) 
                resize($parent_size) 
                sphere(d=$parent_size.x, center=true);
		_translate(-hadamard(anchor, $parent_bounds)/2)
			_child_wrapper() children();
	}
}




module _assign(){
    children();
}

//matrix rotation functions
function _rotate_x_matrix(a)=
							[[1,0,0,0], 
                      [0,cos(a),-sin(a),0], 
                      [0,sin(a),cos(a),0], 
                      [0,0,0,1]]; 

function _rotate_y_matrix(a)=
							[[cos(a),0,sin(a),0], 
                      [0,1,0,0], 
                      [-sin(a),0,cos(a),0], 
                      [0,0,0,1]]; 

function _rotate_z_matrix(a)=
							[[cos(a),-sin(a),0,0], 
                      [sin(a),cos(a),0,0], 
                      [0,0,1,0], 
                      [0,0,0,1]]; 

function _rotate_matrix(a)=_rotate_z_matrix(a.z)*_rotate_y_matrix(a.y)*_rotate_x_matrix(a.x);

function _orient_angles(zaxis)=
				[-asin(zaxis.y / norm(zaxis)),
		  		 atan2(zaxis.x, zaxis.z),
		  		 0];

//private wrapper for translate(), tracks the position of children using a special variable, $position
module _translate(offset){
	_assign($position = $position + offset)
	translate(offset)
	children();
}
	
        
//echo(_sizzle_parse("not(foo,bar)"));
//echo(_sizzle_parse("baz"));
//echo(_sizzle_parse("bar baz"));
//echo(_sizzle_engine([["baz", []],[]], _sizzle_parse("baz")));
//echo(_sizzle_engine([["baz", []],[]], _sizzle_parse("foo,bar")));
//echo(_sizzle_engine([["baz", []],[]], _sizzle_parse("not(foo,bar)")));
//echo(_sizzle_engine([["bar", []],[]], _sizzle_parse("not(foo,bar)")));
//echo(_sizzle_engine([["baz", []], [["bar", []],[]]], _sizzle_parse("bar baz")));
function _sizzle_engine_ancestor(ancestors, sizzle) = 
        //return true if any ancestor matches the sizzle
        len(ancestors) <= 0?
            false
        : _sizzle_engine(_push([], ancestors[0]), sizzle)?
            true
        : 
            _sizzle_engine_ancestor(_pop(ancestors), sizzle)
        ;
function _sizzle_engine(classes, sizzle) = 
	//is sizzle a string?
	sizzle == str(sizzle)?
		sizzle != "" && (sizzle == "*" || _has_token(classes[0], sizzle))
	//is sizzle a known operator?
	: sizzle[0] == "or"?
		_sizzle_engine(classes, sizzle[1]) || _sizzle_engine(classes, sizzle[2])
	: sizzle[0] == "not"?
		!_sizzle_engine(classes, sizzle[1])
	: sizzle[0] == "and"?
		_sizzle_engine(classes, sizzle[1]) && _sizzle_engine(classes, sizzle[2])
	: sizzle[0] == "descendant"? // parameters: descendant, ancestor
		_sizzle_engine(_push([], classes[0]), sizzle[1]) && _sizzle_engine_ancestor(_pop(classes), sizzle[2])
	: sizzle[0] == "child"? // parameters: child, parent
		_sizzle_engine(_push([], classes[0]), sizzle[1]) && _sizzle_engine_ancestor(_push([], _pop(classes)[0]), sizzle[2])
	: //invalid syntax
		false
	;

_sizzle_token_regex = _parse_rx("(\\w|_|-)+|\\S|\\s+");
function _sizzle_parse(sizzle) = 
	sizzle == ""?
		""
	: 
		_sizzle_DFA(
			_tokenize(sizzle, _sizzle_token_regex)
		)
    ;

//echo(_sizzle_DFA(_tokenize("not(foo,bar)")));
//echo(_sizzle_DFA(_tokenize("foo,bar baz")));
//echo(_sizzle_DFA(_tokenize("foo bar,baz")));
//echo(_sizzle_DFA(_tokenize("foo.bar,baz")));
//simulates a deterministic finite automaton that parses tokenized sizzle strings
function _sizzle_DFA(in, ops=[], args=[], pos=0) = 
	pos >= len(in)?
		len(ops) <= 0?
			args[0]
		:
			_sizzle_DFA(in,	_pop(ops),			_push_sizzle_op(args, ops[0]), pos)
	:in[pos] == "not"?
			_sizzle_DFA(in,	_push(ops, "not"),	args, 					pos+1)
	:in[pos] == ","?
			_sizzle_DFA(in,	_push(ops, "or"),	args, 					pos+1)
	:in[pos] == "."?
			_sizzle_DFA(in,	_push(ops, "and"),	args, 					pos+1)
	:in[pos] == ">"?
			_sizzle_DFA(in,	_push(ops, "child"),args, 					pos+1)
    :trim(in[pos]) == ""?
			_sizzle_DFA(in,	_push(ops, "descendant"),args, 				pos+1)
	:in[pos] == "("?
			_sizzle_DFA(in,	_push(ops, "("),	args, 					pos+1)
	:in[pos] == ")"?
		ops[0] == "("?
			_sizzle_DFA(in,	_pop(ops),			args, 					pos+1)
		:
			_sizzle_DFA(in,	_pop(ops),			_push_sizzle_op(args, ops[0]), pos)
	:
			_sizzle_DFA(in,	ops,                _push(args, in[pos]), 	pos+1)
	;
        
function _push_sizzle_op(args, op) = 
	op == "or" || op == "and" || op == "descendant" || op == "child"?
		_push(
			_pop(args, 2),
			[op, args[0], args[1][0]]
		)
	:			//unary
		_push(
			_pop(args),
			[op, args[0]]
		)
	;
	
//echo(_has_token(["baz",[]], "baz"));
//echo(_has_token(tokenize("foo bar baz"), "baz"));
function _has_token(tokens, token) = 
	tokens == undef || len(tokens) <= 0?
		false
	: 
        any([for (i = [0:len(tokens)-1]) tokens[i] == token])
	;	
